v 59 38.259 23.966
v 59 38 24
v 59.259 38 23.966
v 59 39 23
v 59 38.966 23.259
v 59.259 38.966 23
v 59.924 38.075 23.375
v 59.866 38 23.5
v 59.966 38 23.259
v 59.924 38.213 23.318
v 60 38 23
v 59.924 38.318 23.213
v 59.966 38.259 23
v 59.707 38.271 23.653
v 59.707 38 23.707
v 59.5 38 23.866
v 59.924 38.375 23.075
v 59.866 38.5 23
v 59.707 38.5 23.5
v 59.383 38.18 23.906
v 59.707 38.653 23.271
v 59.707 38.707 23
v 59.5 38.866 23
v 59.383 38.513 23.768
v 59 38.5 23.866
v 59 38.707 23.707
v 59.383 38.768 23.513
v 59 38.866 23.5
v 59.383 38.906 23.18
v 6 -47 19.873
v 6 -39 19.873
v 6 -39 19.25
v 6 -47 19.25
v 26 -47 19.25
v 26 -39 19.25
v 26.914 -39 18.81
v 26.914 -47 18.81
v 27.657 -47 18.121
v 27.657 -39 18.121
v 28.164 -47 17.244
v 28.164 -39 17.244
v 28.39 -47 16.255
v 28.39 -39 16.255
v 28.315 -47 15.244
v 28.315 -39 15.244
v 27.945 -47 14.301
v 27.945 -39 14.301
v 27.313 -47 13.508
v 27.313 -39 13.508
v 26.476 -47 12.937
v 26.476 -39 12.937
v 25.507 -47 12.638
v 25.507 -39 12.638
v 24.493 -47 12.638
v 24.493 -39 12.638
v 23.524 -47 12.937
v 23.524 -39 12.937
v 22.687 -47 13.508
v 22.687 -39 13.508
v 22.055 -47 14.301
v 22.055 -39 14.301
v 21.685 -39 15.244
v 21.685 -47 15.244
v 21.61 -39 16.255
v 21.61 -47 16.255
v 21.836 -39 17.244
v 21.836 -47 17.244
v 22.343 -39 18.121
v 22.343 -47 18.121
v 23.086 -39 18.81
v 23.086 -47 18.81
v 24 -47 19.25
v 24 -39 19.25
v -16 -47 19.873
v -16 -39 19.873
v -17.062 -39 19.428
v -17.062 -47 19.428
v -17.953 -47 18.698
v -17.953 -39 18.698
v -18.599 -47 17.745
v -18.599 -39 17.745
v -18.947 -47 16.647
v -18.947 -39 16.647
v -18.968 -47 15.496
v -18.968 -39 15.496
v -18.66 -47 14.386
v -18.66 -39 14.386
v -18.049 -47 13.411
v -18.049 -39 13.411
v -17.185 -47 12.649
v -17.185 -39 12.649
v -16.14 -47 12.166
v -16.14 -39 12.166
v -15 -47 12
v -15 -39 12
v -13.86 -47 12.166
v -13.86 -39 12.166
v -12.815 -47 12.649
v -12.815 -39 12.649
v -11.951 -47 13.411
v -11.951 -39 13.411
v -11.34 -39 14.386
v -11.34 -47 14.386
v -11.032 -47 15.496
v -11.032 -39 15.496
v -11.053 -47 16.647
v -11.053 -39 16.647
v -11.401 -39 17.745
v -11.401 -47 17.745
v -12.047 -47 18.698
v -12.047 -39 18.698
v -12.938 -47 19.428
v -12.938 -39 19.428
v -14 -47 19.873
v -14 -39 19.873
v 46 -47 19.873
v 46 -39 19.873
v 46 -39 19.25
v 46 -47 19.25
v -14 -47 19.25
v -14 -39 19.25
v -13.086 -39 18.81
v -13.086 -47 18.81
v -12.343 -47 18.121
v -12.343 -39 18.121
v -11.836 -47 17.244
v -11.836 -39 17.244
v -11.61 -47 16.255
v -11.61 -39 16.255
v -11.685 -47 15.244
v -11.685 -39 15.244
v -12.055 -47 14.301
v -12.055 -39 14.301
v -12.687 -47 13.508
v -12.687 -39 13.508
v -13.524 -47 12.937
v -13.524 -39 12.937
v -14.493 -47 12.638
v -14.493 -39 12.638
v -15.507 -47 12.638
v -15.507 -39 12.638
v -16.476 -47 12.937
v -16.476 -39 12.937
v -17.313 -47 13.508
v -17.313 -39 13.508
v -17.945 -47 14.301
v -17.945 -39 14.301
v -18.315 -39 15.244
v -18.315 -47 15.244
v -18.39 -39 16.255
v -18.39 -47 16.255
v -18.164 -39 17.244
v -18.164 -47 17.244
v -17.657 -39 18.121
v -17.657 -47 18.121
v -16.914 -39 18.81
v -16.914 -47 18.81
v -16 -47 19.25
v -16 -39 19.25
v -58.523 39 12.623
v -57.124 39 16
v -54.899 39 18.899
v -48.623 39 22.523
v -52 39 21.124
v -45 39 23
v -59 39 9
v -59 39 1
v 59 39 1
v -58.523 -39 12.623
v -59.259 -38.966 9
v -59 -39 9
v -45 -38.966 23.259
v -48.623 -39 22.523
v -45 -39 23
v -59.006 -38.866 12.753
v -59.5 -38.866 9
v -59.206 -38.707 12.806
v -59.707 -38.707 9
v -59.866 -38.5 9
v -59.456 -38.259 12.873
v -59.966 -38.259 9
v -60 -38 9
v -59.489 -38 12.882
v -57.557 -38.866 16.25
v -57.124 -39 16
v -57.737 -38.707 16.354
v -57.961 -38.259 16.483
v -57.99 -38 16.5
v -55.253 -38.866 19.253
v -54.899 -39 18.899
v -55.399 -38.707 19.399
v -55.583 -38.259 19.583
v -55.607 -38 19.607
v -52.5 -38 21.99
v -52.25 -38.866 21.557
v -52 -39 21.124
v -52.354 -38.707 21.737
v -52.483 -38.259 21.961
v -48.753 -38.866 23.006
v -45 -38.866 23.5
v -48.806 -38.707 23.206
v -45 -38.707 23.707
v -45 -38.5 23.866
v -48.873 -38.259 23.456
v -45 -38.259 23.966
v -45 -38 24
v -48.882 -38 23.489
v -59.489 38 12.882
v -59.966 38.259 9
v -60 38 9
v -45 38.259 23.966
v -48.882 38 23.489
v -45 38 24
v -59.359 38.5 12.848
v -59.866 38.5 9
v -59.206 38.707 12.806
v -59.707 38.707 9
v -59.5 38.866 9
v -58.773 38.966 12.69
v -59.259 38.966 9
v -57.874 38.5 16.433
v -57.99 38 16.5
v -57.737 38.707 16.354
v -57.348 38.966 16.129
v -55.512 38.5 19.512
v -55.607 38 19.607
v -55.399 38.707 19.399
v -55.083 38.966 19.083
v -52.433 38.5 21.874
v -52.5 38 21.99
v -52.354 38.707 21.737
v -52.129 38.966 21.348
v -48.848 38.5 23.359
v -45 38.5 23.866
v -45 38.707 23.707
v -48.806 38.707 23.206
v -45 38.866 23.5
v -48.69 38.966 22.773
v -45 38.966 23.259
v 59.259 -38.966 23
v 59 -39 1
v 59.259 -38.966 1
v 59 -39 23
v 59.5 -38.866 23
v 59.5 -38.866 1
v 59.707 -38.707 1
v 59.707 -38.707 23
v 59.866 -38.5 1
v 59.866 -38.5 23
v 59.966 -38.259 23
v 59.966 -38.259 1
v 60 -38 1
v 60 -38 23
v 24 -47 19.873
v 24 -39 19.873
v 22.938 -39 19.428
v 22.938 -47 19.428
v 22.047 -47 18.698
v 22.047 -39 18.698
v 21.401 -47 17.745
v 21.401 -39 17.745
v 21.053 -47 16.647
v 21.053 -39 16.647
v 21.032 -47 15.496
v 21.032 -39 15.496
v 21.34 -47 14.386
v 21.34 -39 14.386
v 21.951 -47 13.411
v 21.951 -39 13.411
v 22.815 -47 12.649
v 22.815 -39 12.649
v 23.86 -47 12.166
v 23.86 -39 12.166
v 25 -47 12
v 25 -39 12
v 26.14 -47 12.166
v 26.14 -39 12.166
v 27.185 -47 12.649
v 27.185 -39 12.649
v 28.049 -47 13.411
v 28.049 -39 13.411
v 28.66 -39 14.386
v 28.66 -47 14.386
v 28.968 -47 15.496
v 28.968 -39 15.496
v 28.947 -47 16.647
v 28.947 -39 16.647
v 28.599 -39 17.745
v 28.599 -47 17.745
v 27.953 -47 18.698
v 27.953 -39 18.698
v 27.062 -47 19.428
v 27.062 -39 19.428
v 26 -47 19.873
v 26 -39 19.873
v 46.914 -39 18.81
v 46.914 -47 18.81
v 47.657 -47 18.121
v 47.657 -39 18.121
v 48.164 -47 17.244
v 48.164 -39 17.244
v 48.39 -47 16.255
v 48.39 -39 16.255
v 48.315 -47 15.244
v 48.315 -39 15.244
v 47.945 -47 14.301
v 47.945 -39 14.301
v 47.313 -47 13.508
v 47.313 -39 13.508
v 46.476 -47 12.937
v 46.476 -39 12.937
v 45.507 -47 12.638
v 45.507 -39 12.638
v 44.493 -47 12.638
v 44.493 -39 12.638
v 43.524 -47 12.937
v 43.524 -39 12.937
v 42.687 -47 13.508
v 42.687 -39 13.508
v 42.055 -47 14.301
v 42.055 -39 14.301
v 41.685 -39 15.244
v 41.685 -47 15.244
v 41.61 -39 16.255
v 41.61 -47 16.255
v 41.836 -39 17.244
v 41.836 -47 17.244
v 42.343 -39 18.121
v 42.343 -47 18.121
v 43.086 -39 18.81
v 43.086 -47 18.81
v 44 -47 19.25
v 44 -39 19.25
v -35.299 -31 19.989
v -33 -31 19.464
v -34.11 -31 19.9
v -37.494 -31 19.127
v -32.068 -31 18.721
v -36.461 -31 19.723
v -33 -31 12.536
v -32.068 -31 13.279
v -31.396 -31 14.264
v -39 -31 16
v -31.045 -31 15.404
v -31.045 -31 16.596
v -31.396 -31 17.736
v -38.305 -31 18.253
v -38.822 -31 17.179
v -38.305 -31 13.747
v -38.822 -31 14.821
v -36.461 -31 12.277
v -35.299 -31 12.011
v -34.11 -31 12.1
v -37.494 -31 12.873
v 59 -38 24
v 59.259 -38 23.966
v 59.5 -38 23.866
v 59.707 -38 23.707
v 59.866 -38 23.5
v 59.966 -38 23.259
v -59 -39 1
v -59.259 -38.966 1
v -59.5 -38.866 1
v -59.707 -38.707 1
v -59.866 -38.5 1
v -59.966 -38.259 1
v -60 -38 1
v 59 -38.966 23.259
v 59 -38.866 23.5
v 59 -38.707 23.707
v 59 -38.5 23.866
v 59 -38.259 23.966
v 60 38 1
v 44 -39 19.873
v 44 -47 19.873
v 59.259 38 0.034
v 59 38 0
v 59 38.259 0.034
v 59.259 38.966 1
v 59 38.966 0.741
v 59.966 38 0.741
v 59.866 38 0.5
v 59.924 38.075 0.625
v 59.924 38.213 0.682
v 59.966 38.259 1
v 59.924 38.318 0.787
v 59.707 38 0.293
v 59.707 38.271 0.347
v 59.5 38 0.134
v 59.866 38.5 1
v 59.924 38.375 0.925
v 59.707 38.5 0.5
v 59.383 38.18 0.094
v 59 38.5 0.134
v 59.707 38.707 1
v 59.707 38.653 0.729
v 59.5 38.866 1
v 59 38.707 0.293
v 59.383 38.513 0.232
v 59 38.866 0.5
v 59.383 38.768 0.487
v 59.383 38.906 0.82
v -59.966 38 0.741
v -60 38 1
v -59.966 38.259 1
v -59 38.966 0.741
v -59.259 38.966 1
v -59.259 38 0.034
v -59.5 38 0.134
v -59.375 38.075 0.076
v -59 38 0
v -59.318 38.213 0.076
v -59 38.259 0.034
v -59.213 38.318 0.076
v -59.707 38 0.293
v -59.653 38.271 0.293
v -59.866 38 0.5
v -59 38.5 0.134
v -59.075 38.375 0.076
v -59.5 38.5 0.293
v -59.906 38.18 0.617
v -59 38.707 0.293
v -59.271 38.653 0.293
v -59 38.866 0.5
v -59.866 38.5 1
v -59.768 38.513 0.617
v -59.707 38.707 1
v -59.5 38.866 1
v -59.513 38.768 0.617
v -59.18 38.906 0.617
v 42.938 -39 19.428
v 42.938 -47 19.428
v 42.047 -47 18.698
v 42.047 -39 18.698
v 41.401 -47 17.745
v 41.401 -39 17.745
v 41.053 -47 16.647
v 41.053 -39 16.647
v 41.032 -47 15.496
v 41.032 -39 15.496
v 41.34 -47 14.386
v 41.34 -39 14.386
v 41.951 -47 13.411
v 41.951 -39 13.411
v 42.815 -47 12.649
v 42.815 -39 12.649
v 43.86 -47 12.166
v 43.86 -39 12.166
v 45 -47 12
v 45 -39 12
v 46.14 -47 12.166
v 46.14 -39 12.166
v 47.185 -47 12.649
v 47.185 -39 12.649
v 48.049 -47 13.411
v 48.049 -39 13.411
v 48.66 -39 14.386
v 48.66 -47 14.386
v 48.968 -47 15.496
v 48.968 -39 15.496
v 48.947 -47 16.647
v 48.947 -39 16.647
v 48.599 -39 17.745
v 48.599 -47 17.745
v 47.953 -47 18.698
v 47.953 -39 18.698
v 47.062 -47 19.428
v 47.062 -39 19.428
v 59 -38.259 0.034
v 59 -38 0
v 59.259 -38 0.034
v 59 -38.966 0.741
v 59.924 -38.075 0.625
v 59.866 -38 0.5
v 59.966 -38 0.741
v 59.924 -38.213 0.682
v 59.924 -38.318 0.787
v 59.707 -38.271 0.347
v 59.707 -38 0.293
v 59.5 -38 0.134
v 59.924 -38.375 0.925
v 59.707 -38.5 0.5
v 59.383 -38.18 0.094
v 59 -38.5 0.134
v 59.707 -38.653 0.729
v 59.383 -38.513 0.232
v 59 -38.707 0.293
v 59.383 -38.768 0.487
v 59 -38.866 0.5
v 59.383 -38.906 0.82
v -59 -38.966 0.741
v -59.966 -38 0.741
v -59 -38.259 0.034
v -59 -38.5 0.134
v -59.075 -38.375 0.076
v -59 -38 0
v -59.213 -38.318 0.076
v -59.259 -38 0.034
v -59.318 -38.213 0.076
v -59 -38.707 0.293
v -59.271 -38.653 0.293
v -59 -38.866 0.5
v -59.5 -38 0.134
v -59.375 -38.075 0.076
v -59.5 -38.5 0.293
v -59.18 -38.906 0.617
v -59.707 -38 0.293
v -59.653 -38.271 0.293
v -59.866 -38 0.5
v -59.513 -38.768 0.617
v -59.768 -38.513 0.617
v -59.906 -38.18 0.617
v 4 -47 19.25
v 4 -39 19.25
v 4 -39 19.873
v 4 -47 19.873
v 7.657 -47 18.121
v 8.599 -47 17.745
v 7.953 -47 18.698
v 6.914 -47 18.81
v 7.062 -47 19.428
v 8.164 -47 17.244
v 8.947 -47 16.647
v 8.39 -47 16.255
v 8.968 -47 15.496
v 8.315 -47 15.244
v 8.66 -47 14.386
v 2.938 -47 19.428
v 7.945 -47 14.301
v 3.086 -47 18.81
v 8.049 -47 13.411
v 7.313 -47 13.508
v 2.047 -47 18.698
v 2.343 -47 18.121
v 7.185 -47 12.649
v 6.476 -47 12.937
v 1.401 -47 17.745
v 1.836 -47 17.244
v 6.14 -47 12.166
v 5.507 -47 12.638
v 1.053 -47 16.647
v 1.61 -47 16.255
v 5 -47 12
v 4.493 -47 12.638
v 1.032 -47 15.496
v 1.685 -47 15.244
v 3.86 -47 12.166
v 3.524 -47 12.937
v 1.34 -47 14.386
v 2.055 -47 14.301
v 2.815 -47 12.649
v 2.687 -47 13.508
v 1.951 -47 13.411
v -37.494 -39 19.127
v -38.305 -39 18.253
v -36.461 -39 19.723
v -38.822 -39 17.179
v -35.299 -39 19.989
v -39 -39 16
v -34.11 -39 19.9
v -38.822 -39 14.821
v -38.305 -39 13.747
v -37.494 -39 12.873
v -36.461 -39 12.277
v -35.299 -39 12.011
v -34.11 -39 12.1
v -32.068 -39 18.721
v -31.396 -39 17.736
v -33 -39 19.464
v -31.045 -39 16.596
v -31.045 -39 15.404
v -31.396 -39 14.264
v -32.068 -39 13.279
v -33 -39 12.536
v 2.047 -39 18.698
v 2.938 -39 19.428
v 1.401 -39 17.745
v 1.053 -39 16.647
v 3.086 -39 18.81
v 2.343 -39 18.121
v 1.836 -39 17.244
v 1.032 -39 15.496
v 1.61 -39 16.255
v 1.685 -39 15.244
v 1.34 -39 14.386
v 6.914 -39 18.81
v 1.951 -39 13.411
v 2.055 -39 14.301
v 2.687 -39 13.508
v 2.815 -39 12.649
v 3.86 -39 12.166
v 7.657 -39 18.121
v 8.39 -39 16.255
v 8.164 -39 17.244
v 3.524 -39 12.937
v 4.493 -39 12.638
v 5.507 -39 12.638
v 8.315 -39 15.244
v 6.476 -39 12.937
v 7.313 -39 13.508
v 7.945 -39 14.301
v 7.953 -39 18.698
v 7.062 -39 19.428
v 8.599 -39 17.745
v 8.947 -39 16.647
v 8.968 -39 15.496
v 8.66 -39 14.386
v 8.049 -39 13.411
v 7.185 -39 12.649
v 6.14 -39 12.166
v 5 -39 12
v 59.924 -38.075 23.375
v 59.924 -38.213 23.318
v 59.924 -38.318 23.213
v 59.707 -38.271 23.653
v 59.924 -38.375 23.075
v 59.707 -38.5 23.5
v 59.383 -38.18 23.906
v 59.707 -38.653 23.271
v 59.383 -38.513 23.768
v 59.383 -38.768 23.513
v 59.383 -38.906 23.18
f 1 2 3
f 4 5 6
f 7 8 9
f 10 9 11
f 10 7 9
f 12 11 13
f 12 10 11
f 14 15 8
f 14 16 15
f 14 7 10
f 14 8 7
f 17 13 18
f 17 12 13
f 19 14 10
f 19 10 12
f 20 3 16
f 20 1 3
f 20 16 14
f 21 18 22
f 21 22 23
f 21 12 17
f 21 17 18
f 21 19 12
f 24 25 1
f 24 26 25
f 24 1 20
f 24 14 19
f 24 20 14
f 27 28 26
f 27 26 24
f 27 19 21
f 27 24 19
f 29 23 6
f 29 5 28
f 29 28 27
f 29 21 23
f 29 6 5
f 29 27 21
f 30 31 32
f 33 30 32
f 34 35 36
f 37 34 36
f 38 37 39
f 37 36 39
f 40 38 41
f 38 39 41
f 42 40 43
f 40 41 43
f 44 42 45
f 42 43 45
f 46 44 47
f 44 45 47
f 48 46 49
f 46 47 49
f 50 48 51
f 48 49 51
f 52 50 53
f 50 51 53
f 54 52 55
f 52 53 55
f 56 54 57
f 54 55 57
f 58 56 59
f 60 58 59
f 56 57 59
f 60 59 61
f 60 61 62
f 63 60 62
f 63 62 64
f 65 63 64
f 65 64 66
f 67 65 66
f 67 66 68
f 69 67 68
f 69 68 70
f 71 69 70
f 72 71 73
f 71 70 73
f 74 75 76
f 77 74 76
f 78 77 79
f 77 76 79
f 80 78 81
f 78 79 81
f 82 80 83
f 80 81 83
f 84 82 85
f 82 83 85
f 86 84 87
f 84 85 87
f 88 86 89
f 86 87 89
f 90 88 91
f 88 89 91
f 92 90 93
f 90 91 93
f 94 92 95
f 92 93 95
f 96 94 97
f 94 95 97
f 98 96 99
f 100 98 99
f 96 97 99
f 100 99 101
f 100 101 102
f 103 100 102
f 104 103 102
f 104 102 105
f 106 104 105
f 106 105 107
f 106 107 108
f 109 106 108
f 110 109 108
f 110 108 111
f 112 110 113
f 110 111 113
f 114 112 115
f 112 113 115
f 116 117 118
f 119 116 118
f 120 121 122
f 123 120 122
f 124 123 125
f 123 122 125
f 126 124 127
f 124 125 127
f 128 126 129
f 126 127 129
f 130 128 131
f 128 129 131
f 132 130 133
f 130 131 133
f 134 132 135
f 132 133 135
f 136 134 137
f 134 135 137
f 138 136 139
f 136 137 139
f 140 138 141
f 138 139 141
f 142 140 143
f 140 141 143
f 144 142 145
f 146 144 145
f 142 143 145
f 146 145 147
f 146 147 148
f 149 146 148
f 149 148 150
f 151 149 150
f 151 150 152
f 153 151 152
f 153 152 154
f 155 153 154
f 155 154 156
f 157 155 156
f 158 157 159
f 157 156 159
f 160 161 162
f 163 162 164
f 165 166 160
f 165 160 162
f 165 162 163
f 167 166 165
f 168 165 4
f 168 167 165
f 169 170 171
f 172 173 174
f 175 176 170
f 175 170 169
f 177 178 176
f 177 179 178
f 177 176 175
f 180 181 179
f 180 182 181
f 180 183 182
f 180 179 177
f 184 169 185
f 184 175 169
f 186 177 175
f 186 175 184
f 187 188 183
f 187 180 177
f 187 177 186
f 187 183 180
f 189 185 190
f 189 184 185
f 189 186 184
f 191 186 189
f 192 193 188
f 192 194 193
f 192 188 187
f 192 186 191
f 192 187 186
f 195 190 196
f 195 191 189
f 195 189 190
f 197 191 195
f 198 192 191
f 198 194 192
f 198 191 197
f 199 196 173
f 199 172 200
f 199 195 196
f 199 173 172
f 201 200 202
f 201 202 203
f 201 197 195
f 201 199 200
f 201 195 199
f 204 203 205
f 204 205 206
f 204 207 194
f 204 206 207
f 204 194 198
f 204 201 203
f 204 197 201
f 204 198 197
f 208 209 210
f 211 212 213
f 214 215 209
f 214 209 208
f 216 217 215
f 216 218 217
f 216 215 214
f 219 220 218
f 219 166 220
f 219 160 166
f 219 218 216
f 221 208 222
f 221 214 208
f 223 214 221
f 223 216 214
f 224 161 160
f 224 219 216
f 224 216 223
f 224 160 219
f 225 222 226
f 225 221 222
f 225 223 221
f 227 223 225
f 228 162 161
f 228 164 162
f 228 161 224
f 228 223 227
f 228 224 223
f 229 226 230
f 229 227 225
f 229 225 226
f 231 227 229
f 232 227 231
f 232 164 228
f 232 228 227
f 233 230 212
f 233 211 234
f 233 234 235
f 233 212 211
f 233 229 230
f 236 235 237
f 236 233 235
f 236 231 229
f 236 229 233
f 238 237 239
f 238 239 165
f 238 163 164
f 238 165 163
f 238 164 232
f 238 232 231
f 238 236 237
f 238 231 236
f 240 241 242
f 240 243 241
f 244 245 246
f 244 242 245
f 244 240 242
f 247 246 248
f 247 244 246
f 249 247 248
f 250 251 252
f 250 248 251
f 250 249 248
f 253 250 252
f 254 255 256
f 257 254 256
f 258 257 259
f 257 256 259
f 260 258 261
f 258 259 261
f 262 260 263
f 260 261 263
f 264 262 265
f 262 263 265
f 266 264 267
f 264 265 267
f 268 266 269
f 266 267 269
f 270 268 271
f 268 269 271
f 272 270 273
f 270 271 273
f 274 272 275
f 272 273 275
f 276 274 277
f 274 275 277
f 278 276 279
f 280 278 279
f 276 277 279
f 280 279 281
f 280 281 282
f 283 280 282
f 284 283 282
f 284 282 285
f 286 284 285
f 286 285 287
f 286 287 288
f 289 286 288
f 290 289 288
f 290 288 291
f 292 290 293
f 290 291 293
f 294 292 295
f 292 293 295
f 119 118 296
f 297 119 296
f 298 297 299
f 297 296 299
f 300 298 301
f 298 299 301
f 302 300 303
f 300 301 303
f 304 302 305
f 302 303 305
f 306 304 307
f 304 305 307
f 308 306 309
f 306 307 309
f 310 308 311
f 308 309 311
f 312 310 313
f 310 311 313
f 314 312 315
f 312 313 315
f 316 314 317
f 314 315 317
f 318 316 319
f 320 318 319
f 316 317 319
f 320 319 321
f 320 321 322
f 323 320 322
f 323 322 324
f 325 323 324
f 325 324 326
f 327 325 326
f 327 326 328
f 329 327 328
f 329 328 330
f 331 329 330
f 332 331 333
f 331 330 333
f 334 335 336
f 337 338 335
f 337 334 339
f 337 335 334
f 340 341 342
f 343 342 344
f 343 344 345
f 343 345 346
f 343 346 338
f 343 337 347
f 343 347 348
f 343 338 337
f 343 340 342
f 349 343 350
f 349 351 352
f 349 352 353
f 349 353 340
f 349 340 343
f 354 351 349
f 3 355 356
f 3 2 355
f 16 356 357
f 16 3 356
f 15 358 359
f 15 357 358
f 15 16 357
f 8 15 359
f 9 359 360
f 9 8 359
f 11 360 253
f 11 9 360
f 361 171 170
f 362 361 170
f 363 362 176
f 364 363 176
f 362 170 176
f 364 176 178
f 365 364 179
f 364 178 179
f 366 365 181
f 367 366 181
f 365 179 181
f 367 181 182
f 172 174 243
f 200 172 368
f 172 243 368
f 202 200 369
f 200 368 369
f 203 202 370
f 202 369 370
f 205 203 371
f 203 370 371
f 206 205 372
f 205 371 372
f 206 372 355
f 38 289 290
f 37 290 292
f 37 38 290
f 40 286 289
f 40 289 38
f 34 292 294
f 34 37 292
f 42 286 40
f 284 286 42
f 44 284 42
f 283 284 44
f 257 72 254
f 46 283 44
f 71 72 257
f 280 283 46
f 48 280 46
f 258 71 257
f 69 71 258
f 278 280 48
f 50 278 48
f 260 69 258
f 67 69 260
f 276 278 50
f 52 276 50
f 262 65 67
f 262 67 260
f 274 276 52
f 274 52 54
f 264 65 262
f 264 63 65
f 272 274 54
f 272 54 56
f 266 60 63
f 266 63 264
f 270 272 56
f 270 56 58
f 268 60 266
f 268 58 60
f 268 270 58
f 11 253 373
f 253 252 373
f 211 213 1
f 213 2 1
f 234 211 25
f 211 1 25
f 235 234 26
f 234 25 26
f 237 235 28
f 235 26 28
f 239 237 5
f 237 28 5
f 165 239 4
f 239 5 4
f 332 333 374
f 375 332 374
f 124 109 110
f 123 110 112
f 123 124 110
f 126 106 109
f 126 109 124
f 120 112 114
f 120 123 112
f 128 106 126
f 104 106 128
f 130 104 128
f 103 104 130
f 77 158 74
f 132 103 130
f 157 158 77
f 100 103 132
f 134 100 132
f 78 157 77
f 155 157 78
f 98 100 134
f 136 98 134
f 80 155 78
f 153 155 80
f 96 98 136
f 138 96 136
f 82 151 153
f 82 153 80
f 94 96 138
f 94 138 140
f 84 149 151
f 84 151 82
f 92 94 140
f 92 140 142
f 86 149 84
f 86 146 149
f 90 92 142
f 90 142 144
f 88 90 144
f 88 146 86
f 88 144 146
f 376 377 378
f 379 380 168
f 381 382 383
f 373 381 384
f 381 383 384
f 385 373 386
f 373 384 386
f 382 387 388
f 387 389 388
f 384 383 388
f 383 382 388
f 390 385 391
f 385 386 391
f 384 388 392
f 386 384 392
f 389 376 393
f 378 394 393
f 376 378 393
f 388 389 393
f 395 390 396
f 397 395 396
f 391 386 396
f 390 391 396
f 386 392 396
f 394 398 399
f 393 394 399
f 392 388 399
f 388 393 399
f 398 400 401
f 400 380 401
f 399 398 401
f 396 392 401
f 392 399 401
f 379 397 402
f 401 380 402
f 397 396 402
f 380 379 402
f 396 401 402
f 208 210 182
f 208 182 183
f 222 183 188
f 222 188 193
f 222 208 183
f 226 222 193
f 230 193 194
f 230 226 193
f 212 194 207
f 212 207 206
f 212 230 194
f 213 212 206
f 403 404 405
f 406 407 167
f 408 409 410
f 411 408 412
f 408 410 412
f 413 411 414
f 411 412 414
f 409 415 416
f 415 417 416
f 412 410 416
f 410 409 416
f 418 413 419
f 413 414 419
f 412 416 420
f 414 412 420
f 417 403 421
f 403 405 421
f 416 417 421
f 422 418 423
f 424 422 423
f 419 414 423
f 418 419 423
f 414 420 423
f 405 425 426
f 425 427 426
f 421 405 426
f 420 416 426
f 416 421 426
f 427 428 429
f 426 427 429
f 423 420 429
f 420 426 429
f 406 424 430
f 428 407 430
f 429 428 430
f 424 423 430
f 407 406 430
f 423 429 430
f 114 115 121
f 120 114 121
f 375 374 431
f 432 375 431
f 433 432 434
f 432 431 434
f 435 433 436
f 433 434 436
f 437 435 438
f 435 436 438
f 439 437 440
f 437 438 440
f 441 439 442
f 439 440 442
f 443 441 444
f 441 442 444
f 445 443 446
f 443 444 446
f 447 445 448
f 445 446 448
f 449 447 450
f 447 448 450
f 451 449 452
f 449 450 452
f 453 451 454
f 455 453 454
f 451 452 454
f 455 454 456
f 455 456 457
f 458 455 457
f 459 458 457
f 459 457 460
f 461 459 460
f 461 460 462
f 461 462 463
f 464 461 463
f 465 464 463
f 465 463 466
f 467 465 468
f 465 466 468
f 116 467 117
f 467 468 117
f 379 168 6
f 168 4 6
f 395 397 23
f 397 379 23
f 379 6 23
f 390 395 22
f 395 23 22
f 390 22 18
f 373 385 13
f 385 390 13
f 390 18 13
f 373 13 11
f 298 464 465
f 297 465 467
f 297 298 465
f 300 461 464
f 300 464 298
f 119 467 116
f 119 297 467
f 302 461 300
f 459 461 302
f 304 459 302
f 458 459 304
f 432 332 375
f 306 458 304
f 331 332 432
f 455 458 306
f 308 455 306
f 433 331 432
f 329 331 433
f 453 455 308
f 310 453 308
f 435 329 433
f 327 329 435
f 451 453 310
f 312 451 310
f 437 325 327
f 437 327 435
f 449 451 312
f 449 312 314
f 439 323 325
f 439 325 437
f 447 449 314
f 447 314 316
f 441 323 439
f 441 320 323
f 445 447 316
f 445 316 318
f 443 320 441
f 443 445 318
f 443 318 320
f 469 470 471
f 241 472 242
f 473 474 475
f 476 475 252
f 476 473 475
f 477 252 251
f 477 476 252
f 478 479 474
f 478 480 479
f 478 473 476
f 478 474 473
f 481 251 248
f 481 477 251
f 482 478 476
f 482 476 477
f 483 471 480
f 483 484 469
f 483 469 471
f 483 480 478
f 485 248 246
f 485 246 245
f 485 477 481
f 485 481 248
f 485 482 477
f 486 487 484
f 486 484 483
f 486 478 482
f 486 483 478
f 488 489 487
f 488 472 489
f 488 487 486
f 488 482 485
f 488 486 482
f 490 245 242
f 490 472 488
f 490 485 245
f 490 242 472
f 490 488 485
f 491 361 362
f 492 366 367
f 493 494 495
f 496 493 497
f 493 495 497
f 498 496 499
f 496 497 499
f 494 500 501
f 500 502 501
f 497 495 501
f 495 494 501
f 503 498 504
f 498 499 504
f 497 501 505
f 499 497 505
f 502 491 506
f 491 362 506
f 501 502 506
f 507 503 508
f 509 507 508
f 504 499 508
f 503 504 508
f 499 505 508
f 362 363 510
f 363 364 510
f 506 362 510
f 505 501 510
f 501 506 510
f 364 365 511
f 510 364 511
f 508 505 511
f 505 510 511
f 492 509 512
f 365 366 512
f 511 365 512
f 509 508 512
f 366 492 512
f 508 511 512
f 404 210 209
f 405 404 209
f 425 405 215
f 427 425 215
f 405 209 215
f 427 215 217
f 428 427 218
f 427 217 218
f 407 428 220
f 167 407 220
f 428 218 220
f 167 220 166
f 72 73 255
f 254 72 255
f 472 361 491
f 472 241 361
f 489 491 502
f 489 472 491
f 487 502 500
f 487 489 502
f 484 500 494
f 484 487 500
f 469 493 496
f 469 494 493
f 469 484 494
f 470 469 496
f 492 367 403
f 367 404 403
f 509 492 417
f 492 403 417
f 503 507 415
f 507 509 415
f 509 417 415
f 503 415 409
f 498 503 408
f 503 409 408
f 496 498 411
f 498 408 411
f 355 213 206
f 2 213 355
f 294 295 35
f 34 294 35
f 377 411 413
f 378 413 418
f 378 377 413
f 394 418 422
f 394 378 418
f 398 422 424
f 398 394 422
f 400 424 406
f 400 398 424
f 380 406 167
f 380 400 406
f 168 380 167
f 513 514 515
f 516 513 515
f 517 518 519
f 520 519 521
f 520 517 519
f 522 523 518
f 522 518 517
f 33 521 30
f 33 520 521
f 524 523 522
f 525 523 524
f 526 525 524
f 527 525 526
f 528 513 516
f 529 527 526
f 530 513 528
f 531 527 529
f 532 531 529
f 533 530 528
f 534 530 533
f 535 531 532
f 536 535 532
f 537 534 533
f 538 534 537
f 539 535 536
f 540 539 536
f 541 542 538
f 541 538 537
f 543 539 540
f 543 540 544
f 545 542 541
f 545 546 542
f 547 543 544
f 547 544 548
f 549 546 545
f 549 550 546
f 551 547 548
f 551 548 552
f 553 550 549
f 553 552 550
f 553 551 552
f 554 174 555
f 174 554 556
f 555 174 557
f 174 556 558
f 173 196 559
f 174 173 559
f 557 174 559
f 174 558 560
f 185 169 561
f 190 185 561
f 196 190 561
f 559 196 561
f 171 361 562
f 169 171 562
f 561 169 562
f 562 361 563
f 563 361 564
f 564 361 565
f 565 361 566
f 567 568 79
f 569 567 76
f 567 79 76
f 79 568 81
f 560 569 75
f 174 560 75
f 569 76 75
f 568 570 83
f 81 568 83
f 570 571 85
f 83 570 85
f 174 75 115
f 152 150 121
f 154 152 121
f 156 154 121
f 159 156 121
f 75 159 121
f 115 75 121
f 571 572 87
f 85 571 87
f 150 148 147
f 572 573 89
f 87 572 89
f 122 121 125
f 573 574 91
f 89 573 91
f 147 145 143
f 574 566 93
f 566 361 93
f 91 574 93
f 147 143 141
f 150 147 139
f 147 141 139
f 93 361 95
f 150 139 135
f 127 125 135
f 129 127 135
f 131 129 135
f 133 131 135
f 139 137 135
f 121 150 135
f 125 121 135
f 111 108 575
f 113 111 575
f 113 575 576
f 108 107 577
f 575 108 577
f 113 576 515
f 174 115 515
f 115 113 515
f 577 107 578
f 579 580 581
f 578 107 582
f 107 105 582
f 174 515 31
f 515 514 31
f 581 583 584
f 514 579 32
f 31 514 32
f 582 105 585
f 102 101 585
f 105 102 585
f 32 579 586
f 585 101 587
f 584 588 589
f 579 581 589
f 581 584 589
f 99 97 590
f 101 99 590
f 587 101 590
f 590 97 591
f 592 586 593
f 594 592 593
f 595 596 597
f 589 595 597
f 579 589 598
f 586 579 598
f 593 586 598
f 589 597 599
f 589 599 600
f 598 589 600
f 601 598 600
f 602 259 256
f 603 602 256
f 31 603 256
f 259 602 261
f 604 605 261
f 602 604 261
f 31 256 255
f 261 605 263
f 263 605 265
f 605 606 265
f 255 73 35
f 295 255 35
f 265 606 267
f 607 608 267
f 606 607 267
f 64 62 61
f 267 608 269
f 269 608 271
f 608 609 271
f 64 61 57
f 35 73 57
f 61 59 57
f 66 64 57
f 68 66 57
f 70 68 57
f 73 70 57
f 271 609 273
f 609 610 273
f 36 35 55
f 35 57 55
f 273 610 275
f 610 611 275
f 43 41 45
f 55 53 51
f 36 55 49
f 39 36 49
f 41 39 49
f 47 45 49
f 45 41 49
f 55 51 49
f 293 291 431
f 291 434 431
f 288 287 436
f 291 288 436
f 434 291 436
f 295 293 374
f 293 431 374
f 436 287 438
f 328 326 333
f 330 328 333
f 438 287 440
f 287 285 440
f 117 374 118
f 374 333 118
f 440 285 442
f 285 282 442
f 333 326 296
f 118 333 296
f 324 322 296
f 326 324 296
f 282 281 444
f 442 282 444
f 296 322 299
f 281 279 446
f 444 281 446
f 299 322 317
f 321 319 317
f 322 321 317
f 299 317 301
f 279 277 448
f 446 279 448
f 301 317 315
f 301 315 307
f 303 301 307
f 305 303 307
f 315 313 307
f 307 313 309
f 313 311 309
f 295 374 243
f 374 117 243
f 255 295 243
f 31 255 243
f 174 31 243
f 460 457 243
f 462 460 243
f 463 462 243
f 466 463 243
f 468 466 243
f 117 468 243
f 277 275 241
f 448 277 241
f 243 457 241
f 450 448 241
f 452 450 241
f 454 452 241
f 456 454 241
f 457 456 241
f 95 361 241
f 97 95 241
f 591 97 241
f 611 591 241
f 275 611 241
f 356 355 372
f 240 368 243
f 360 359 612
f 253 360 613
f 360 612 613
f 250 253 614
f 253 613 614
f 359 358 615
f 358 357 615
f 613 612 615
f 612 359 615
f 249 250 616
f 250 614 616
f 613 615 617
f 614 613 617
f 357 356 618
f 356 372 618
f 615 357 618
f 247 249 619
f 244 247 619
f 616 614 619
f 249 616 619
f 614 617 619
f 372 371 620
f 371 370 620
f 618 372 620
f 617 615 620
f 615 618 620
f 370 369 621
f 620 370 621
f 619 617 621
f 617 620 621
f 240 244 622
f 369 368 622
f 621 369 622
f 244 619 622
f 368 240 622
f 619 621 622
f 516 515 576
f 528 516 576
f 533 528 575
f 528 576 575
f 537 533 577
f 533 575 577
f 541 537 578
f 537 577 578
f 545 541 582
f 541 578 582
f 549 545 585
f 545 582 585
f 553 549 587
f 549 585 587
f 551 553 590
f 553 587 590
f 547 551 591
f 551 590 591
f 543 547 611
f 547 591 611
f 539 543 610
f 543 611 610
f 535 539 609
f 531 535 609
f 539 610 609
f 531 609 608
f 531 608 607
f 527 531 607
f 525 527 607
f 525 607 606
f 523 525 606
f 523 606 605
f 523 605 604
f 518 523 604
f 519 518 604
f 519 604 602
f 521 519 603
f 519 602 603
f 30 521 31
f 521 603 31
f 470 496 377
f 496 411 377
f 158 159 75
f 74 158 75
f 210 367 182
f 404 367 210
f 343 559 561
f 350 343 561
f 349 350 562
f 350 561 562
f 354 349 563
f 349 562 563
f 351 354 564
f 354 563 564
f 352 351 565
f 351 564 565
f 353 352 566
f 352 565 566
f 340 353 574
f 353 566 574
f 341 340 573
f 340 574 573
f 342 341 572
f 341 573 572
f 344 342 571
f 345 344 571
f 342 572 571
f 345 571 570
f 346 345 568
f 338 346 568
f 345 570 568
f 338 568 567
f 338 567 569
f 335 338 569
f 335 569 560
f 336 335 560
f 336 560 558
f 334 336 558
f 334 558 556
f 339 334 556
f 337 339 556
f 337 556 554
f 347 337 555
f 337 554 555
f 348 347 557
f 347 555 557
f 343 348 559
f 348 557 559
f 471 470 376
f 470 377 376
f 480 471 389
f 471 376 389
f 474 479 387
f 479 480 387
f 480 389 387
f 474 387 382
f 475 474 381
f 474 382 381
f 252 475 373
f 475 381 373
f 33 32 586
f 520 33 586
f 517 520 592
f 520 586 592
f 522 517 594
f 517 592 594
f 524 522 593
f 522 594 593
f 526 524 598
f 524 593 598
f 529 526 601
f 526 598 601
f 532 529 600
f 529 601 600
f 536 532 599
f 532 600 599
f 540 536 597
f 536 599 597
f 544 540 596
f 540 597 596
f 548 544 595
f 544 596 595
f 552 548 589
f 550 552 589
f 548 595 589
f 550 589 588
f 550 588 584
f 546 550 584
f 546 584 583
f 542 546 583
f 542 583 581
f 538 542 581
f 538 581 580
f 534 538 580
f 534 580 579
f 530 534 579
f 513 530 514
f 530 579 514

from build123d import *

# Parameters (mm, degrees)
SKETCH1_W           = 120
SKETCH1_H           = 78
BOSS_EXTRUDE1_DEPTH = 24
FILLET1_R           = 15
FILLET2_R           = 1
BOSS_EXTRUDE2_DEPTH = 8
SKETCH2_3_R         = 4
CUT_EXTRUDE1_DEPTH  = 8


with BuildPart() as part:
    # Sketch1 → Boss-Extrude1 (new body)
    with BuildSketch(Plane.XY):
        Rectangle(SKETCH1_W, SKETCH1_H)
    extrude(amount=BOSS_EXTRUDE1_DEPTH)

    # Fillet1
    fillet1_edges = [part.edges().sort_by_distance(p)[0] for p in [
        (-60, 0, 24),
    ]]
    fillet(fillet1_edges, radius=FILLET1_R)

    # Fillet2
    fillet2_edges = [part.edges().sort_by_distance(p)[0] for p in [
        (7.5, -39, 24),
        (-60, -39, 4.5),
        (-55.606601718, -39, 19.606601718),
        (-60, 39, 4.5),
        (-55.606601718, 39, 19.606601718),
        (60, 0, 24),
        (0, -39, 0),
        (-60, 0, 0),
        (0, 39, 0),
        (60, 0, 0),
        (60, -39, 12),
        (60, 39, 12),
        (7.5, 39, 24),
    ]]
    fillet(fillet2_edges, radius=FILLET2_R)

    # Sketch2 → Boss-Extrude2 (add)
    with BuildSketch(Plane(origin=(0, -39, 0), x_dir=(-1, 0, 0), z_dir=(0, -1, 0))):
        with BuildLine():
            Line((16, -19.249615362), (16, -19.872983346))
            ThreePointArc((16, -19.872983346), (15, -12), (14, -19.872983346))
            Line((14, -19.872983346), (14, -19.249615362))
            ThreePointArc((14, -19.249615362), (15, -12.6), (16, -19.249615362))
        make_face()
        with BuildLine():
            ThreePointArc((-4, -19.872983346), (-5, -12), (-6, -19.872983346))
            Line((-6, -19.872983346), (-6, -19.249615362))
            ThreePointArc((-6, -19.249615362), (-5, -12.6), (-4, -19.249615362))
            Line((-4, -19.249615362), (-4, -19.872983346))
        make_face()
        with BuildLine():
            ThreePointArc((-24, -19.872983346), (-25, -12), (-26, -19.872983346))
            Line((-26, -19.872983346), (-26, -19.249615362))
            ThreePointArc((-26, -19.249615362), (-25, -12.6), (-24, -19.249615362))
            Line((-24, -19.249615362), (-24, -19.872983346))
        make_face()
        with BuildLine():
            ThreePointArc((-44, -19.872983346), (-45, -12), (-46, -19.872983346))
            Line((-46, -19.872983346), (-46, -19.249615362))
            ThreePointArc((-46, -19.249615362), (-45, -12.6), (-44, -19.249615362))
            Line((-44, -19.249615362), (-44, -19.872983346))
        make_face()
    extrude(amount=BOSS_EXTRUDE2_DEPTH)

    # Sketch2<3> → Cut-Extrude1 (cut)
    with BuildSketch(Plane(origin=(0, -39, 0), x_dir=(-1, 0, 0), z_dir=(0, -1, 0))):
        with Locations((35, -16)):
            Circle(SKETCH2_3_R)
    extrude(amount=-CUT_EXTRUDE1_DEPTH, mode=Mode.SUBTRACT)


solid = part.part
